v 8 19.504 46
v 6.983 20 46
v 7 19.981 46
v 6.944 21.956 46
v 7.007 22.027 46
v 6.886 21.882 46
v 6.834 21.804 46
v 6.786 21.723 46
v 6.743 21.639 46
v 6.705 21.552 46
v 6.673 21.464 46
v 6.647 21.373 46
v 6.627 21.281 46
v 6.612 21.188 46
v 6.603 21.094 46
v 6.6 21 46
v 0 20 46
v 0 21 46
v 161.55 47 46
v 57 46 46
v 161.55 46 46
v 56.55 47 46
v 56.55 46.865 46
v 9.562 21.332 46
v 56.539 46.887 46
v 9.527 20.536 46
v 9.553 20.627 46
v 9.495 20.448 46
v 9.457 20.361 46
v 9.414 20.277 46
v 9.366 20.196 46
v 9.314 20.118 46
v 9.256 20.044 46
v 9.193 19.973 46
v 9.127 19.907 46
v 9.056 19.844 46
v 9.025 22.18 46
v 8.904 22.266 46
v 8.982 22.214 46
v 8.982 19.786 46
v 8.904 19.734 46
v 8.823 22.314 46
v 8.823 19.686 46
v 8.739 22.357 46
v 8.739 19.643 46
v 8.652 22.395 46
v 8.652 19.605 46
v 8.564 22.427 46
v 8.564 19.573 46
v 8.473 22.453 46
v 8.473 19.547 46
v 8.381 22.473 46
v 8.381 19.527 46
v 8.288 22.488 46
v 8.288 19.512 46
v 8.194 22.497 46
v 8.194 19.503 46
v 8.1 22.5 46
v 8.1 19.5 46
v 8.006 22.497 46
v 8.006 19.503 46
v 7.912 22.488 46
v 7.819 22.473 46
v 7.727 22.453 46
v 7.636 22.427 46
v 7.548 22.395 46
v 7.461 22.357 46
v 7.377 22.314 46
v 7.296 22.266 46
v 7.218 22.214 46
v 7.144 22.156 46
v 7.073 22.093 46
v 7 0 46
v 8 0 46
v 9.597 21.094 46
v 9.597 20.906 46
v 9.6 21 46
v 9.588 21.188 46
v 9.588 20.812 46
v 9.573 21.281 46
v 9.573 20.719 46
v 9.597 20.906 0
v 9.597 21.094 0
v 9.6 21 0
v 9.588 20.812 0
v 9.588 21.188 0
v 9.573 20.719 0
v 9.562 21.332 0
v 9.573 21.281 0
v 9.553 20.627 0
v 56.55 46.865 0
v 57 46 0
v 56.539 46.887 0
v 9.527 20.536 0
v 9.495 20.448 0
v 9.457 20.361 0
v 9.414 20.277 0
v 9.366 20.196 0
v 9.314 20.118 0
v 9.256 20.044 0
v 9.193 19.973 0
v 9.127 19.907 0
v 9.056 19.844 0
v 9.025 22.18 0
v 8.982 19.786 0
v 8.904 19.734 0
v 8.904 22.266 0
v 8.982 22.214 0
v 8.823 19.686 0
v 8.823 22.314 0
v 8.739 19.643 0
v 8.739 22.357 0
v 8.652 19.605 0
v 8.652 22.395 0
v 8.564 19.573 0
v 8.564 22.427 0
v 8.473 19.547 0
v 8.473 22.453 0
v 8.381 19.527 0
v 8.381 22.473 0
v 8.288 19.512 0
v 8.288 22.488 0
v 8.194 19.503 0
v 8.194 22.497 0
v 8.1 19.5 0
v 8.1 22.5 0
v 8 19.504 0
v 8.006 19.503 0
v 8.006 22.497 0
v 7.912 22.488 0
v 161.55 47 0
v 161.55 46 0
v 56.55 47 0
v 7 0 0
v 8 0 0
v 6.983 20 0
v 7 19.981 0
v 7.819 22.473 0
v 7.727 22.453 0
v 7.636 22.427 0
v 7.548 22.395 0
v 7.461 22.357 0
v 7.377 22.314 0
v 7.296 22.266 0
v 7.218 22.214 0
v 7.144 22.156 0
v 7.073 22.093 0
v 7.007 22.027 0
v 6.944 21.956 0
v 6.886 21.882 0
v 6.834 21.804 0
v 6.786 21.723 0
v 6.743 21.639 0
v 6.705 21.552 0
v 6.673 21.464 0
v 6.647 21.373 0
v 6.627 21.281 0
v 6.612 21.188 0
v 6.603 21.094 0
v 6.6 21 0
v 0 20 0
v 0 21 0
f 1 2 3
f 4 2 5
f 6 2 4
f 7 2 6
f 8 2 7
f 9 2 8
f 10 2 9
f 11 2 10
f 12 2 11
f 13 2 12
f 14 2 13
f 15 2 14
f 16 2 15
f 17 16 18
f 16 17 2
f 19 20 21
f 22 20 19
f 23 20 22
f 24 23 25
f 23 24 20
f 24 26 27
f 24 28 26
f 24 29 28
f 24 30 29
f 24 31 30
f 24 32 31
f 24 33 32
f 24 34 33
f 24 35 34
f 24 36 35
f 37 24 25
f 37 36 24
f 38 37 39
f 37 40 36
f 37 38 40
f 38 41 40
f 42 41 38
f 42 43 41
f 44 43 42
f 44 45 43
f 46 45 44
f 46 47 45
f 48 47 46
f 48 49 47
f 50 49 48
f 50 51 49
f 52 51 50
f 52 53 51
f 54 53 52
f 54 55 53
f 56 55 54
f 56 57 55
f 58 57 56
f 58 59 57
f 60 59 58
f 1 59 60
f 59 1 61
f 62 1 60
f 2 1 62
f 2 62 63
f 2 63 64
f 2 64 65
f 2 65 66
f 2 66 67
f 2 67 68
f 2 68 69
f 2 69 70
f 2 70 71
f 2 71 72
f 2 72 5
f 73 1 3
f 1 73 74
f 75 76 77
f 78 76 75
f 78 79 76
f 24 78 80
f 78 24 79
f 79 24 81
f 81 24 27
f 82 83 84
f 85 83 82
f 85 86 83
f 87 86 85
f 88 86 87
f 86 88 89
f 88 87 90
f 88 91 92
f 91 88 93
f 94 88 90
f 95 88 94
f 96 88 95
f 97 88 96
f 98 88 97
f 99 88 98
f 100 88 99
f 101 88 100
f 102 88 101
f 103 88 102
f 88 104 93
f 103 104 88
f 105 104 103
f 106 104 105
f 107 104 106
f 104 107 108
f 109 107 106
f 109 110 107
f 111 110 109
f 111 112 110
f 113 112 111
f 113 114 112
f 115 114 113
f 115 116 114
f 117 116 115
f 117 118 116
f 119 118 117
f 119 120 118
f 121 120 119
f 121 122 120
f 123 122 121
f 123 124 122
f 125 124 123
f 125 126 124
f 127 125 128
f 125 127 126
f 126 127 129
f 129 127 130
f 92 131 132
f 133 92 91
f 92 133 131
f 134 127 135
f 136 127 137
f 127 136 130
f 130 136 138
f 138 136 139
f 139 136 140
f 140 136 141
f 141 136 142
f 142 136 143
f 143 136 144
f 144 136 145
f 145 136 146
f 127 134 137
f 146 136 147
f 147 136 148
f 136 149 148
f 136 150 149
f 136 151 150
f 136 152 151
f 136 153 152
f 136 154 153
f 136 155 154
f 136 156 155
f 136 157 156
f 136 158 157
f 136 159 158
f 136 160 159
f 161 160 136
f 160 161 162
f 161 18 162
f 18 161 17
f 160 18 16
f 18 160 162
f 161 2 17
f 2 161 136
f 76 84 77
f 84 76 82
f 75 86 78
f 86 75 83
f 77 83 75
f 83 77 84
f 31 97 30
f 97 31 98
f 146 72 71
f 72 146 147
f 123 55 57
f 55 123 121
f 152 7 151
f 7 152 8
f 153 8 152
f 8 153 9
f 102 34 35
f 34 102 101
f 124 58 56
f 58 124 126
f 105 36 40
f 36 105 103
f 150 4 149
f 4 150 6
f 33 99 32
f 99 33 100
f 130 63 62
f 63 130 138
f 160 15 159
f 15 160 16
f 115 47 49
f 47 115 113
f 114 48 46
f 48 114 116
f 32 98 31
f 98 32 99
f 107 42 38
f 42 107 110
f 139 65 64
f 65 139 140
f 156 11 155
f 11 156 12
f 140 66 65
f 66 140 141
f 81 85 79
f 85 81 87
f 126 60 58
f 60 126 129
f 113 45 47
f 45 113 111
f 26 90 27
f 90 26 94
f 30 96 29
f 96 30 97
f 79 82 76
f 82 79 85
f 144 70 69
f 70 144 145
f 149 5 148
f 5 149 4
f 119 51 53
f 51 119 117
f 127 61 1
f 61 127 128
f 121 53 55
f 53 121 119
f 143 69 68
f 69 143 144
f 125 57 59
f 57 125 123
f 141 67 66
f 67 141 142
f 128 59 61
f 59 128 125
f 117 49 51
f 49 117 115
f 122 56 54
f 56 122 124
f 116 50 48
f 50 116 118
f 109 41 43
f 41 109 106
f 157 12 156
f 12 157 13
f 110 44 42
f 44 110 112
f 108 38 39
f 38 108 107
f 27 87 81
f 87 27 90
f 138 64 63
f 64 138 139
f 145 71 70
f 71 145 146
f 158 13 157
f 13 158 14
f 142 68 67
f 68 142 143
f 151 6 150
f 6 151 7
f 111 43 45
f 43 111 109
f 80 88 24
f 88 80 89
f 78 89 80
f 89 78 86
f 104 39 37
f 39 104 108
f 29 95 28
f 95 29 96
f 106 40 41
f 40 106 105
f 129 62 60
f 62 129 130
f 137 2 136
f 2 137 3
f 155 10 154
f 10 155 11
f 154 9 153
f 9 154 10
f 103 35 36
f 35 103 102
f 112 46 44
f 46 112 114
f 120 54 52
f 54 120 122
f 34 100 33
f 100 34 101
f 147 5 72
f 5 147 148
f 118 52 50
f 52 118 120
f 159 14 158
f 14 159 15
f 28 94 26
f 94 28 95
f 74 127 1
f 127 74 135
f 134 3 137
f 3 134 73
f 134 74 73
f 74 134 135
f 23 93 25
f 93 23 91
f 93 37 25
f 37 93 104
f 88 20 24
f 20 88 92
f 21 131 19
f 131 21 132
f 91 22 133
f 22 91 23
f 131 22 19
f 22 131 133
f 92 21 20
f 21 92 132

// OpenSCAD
thickness=1;
depth=46;
attachmentUpperWidth=7;
attachmentLowerHeight=20;
attachmentToTailWidth=155;
attachmentToTailHeight=26;
attachmentToElevationEndWidth=50;
translate([0,attachmentLowerHeight,0]) {
    cube([attachmentUpperWidth,thickness,depth]);
}
translate([attachmentUpperWidth+1.1,attachmentLowerHeight+1,0]) {
    cylinder($fn = 100,h = depth, r1 = 1.5, r2 = 1.5, center = false);
}
translate([attachmentUpperWidth,0,0]) {
    cube([thickness,attachmentLowerHeight,depth]);
}
translate([attachmentUpperWidth,attachmentLowerHeight,0]) {
    lol=atan(attachmentToTailHeight/attachmentToElevationEndWidth);
    rotate(a=lol, v=[0,0,1])
    cube([sqrt(pow(attachmentToElevationEndWidth,2)+pow(attachmentToTailHeight,2)),thickness,depth]);
}
translate([attachmentUpperWidth+attachmentToElevationEndWidth-0.45,attachmentLowerHeight+attachmentToTailHeight,0]) {
    cube([attachmentToTailWidth-attachmentToElevationEndWidth,thickness,depth]);
}
echo(version=version());
